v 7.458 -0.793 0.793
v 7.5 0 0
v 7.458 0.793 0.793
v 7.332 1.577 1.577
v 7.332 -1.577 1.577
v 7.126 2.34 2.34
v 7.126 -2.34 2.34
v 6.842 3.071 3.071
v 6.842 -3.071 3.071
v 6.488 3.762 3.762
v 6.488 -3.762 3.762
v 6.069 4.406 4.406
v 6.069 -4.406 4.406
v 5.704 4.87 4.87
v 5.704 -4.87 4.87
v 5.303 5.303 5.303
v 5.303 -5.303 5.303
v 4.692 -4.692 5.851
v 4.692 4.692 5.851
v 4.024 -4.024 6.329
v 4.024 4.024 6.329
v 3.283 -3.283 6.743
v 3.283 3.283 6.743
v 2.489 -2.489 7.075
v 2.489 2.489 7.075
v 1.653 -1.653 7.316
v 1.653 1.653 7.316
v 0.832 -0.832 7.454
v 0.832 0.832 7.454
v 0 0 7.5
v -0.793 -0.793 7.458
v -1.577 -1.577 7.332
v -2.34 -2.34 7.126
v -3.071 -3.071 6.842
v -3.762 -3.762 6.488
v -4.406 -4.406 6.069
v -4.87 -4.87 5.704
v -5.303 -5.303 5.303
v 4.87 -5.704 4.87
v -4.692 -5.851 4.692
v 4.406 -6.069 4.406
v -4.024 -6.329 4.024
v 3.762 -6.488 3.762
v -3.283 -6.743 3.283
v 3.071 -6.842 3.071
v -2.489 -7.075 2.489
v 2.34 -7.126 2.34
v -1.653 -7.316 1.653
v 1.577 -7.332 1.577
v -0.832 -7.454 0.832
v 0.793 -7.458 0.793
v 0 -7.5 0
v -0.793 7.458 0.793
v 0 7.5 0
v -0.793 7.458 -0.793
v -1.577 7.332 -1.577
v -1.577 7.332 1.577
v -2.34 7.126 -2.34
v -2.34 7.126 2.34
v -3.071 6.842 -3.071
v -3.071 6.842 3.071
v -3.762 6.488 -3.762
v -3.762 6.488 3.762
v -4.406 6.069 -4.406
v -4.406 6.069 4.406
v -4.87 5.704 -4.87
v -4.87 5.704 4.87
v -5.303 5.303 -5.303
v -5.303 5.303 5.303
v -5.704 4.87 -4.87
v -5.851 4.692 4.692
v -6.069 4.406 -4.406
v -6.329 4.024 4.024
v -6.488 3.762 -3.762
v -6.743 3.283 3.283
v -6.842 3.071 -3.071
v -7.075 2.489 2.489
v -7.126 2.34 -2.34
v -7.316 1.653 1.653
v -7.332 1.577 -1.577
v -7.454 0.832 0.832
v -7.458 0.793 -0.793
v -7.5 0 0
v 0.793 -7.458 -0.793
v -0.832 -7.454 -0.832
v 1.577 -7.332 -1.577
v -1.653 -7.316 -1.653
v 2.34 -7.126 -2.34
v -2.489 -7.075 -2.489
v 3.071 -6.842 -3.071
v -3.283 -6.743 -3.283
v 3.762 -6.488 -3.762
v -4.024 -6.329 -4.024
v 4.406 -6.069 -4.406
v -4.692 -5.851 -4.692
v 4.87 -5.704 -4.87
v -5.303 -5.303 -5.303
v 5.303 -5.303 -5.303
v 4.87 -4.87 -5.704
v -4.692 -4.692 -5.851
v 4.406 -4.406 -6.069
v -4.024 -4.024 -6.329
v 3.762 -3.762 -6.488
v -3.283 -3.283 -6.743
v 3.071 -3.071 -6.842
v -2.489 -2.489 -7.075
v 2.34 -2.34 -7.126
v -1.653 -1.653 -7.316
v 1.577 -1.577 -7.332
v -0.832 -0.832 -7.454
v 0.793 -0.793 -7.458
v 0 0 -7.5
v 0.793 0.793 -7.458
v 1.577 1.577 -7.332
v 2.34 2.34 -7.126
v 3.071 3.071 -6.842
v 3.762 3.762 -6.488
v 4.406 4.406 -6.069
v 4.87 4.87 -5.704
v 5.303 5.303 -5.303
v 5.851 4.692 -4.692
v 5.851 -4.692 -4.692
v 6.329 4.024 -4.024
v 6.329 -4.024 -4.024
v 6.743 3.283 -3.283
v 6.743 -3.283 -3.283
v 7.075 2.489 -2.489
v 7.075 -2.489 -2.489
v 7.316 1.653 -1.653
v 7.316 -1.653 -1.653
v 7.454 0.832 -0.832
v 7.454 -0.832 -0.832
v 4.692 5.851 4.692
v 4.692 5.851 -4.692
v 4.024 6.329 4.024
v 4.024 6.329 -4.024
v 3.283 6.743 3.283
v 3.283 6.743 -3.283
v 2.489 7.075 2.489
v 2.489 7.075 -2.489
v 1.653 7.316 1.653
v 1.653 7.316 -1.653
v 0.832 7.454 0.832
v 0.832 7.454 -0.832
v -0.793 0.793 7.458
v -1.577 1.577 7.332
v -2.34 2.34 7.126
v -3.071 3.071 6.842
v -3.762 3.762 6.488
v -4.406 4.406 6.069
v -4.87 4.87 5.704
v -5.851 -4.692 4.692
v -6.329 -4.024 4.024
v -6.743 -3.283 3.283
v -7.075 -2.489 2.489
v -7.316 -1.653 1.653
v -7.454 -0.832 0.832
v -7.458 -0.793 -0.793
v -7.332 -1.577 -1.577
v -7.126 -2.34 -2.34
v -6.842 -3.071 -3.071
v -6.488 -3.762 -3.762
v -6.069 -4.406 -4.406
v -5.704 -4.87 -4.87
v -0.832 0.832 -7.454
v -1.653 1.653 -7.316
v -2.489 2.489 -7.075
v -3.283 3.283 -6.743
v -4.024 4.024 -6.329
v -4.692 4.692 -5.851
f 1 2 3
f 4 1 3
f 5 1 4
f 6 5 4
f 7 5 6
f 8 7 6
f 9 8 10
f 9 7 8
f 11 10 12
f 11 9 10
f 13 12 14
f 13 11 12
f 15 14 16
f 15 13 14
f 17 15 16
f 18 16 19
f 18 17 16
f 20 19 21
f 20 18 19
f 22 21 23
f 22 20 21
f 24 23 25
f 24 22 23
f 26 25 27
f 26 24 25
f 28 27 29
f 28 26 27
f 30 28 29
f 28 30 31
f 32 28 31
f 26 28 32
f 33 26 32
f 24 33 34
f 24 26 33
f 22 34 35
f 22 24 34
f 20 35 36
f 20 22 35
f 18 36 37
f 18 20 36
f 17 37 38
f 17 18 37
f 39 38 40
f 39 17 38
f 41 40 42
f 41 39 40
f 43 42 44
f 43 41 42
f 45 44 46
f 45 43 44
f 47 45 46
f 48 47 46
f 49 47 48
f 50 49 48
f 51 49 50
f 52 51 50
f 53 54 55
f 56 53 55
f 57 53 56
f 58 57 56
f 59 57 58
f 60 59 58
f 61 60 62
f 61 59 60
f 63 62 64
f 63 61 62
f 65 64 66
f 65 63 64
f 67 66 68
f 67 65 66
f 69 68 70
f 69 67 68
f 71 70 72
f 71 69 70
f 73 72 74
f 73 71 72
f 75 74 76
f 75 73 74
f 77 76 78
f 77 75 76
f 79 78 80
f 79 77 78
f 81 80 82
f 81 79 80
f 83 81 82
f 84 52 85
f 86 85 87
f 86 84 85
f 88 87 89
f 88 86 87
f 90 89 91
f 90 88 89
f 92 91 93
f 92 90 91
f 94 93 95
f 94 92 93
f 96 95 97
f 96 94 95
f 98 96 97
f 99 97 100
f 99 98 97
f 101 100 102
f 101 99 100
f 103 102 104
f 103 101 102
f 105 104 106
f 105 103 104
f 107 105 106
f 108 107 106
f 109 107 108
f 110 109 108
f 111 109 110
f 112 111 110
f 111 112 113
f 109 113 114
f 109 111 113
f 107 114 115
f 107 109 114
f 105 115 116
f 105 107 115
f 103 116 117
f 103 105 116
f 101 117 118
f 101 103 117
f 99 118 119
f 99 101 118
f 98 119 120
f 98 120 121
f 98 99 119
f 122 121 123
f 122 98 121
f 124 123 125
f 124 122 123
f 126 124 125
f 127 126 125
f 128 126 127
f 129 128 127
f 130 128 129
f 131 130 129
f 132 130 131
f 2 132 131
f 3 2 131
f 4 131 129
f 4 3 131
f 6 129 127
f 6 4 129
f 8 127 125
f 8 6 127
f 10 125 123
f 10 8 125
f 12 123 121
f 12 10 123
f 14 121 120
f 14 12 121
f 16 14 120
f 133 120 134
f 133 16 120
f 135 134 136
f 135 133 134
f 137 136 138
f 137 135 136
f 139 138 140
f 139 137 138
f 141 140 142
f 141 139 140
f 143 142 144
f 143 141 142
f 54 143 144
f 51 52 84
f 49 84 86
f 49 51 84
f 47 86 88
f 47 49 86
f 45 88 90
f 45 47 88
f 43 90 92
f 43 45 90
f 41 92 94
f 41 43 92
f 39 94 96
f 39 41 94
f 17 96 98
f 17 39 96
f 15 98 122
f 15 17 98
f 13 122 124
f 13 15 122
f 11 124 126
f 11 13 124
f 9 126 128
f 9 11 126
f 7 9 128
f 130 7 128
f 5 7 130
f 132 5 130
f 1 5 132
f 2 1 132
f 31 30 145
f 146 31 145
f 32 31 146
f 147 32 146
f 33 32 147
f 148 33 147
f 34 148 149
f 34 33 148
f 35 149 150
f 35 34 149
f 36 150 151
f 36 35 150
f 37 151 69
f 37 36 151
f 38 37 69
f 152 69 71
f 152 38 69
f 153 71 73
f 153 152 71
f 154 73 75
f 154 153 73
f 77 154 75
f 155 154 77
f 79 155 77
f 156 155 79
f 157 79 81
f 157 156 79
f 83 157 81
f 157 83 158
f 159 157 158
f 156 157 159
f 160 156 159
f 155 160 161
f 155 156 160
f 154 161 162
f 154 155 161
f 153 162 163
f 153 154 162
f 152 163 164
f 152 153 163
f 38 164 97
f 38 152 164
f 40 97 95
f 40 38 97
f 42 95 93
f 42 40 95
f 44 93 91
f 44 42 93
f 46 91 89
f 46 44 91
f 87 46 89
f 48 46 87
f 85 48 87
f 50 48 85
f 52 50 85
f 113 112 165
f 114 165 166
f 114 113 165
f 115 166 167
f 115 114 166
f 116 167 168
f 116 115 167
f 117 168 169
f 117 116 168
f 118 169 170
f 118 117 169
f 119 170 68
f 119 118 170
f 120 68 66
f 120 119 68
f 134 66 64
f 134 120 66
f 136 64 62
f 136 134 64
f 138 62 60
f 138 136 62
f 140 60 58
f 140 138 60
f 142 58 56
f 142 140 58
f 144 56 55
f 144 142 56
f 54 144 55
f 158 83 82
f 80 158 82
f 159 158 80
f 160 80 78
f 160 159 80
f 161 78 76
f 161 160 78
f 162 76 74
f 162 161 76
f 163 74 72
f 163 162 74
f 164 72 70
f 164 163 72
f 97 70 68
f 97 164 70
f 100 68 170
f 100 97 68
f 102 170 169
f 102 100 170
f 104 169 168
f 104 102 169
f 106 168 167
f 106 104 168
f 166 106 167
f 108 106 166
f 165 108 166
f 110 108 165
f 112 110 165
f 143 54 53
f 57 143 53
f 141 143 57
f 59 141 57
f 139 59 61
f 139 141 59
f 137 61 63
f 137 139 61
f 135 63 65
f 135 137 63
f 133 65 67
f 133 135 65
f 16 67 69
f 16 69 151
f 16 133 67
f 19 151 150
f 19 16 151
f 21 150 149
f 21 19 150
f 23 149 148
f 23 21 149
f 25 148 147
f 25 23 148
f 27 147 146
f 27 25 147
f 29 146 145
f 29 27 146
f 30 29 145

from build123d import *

# Parameters (mm, degrees)
F0_R     = 7.5
F3_DEPTH = 7.5
F1_R     = 7.5
F4_DEPTH = 7.5
F2_R     = 7.5
F5_DEPTH = 7.5


with BuildPart() as f3:
    # F0 (on Front) → F3 (new body, symmetric)
    with BuildSketch(Plane.XZ):
        Circle(F0_R)
    extrude(amount=F3_DEPTH, both=True)

    # F1 (on Top) → F4 (intersect, symmetric)
    with BuildSketch(Plane.XY):
        Circle(F1_R)
    extrude(amount=F4_DEPTH, both=True, mode=Mode.INTERSECT)

    # F2 (on Right) → F5 (intersect, symmetric)
    with BuildSketch(Plane.YZ):
        Circle(F2_R)
    extrude(amount=F5_DEPTH, both=True, mode=Mode.INTERSECT)


solid = f3.part
